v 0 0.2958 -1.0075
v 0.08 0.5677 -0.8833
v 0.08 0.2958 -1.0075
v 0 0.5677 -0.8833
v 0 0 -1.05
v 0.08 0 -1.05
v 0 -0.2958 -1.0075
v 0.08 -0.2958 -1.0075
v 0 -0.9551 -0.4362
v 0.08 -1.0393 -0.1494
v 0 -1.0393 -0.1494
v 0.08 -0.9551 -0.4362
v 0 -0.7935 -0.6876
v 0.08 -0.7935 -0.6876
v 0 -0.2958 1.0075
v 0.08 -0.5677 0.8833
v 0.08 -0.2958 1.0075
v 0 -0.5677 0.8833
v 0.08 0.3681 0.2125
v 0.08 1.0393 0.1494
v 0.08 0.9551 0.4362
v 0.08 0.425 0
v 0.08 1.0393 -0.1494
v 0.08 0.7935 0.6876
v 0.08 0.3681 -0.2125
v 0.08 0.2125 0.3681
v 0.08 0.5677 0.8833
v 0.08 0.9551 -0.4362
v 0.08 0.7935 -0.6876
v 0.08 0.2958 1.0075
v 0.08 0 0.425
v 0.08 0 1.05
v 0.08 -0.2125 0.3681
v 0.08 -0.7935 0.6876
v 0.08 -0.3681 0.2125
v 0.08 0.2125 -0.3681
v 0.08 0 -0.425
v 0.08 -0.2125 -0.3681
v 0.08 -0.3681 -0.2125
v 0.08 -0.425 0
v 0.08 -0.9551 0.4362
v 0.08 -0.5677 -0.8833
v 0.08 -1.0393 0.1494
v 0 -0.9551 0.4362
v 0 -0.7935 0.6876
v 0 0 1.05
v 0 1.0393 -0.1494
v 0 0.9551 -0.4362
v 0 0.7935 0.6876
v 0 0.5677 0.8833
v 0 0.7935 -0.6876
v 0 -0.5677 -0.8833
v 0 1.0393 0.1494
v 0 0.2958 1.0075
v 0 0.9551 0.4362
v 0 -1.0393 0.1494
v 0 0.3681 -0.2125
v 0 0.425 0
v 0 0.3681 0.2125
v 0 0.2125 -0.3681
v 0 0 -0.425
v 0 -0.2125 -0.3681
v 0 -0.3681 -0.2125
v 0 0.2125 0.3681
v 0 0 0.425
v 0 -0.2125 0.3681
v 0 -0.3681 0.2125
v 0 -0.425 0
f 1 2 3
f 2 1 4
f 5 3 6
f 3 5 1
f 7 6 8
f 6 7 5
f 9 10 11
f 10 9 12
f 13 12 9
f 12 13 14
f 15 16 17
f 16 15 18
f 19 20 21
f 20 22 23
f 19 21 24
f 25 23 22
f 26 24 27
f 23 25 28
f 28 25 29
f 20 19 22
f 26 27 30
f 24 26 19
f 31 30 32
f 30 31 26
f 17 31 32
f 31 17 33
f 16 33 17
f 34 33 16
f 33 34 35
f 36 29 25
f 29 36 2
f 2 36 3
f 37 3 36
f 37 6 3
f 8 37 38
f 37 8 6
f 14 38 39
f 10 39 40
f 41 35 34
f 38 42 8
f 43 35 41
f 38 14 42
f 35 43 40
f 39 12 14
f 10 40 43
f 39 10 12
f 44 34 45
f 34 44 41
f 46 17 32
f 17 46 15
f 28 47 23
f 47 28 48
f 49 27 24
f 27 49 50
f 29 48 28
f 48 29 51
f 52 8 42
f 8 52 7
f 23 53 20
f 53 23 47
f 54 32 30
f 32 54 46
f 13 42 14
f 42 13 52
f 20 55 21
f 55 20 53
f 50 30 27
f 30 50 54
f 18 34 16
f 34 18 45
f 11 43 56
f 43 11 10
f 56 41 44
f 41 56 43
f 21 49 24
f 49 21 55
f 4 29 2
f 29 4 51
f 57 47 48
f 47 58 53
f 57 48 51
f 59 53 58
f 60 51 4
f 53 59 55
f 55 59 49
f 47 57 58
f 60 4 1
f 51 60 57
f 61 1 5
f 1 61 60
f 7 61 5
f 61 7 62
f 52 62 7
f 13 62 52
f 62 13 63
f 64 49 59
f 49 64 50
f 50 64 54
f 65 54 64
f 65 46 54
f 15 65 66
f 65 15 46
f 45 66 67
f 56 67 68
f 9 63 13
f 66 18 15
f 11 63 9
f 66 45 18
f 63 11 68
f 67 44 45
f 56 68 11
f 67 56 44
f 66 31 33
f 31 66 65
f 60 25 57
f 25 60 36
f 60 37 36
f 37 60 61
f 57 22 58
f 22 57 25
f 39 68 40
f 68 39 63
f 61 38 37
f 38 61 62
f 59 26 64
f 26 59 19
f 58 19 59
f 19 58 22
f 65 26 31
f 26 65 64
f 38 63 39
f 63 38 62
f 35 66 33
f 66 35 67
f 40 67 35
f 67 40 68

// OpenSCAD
module washer(rotation=0, thickness = 0.08) 
{
    diameter = 2.1;
    hole = 0.85;
    
    rotate([0,90,rotation]) 
    color([0.0,0.8,1.0])
    translate([0,0,thickness*0.5]) 
    {
        difference() {
            cylinder(h=thickness, r=diameter/2, $fn = 22, center=true);
            cylinder(h=thickness+0.1, r=hole/2, $fn = 12, center=true);
        }
    }
}

washer();
